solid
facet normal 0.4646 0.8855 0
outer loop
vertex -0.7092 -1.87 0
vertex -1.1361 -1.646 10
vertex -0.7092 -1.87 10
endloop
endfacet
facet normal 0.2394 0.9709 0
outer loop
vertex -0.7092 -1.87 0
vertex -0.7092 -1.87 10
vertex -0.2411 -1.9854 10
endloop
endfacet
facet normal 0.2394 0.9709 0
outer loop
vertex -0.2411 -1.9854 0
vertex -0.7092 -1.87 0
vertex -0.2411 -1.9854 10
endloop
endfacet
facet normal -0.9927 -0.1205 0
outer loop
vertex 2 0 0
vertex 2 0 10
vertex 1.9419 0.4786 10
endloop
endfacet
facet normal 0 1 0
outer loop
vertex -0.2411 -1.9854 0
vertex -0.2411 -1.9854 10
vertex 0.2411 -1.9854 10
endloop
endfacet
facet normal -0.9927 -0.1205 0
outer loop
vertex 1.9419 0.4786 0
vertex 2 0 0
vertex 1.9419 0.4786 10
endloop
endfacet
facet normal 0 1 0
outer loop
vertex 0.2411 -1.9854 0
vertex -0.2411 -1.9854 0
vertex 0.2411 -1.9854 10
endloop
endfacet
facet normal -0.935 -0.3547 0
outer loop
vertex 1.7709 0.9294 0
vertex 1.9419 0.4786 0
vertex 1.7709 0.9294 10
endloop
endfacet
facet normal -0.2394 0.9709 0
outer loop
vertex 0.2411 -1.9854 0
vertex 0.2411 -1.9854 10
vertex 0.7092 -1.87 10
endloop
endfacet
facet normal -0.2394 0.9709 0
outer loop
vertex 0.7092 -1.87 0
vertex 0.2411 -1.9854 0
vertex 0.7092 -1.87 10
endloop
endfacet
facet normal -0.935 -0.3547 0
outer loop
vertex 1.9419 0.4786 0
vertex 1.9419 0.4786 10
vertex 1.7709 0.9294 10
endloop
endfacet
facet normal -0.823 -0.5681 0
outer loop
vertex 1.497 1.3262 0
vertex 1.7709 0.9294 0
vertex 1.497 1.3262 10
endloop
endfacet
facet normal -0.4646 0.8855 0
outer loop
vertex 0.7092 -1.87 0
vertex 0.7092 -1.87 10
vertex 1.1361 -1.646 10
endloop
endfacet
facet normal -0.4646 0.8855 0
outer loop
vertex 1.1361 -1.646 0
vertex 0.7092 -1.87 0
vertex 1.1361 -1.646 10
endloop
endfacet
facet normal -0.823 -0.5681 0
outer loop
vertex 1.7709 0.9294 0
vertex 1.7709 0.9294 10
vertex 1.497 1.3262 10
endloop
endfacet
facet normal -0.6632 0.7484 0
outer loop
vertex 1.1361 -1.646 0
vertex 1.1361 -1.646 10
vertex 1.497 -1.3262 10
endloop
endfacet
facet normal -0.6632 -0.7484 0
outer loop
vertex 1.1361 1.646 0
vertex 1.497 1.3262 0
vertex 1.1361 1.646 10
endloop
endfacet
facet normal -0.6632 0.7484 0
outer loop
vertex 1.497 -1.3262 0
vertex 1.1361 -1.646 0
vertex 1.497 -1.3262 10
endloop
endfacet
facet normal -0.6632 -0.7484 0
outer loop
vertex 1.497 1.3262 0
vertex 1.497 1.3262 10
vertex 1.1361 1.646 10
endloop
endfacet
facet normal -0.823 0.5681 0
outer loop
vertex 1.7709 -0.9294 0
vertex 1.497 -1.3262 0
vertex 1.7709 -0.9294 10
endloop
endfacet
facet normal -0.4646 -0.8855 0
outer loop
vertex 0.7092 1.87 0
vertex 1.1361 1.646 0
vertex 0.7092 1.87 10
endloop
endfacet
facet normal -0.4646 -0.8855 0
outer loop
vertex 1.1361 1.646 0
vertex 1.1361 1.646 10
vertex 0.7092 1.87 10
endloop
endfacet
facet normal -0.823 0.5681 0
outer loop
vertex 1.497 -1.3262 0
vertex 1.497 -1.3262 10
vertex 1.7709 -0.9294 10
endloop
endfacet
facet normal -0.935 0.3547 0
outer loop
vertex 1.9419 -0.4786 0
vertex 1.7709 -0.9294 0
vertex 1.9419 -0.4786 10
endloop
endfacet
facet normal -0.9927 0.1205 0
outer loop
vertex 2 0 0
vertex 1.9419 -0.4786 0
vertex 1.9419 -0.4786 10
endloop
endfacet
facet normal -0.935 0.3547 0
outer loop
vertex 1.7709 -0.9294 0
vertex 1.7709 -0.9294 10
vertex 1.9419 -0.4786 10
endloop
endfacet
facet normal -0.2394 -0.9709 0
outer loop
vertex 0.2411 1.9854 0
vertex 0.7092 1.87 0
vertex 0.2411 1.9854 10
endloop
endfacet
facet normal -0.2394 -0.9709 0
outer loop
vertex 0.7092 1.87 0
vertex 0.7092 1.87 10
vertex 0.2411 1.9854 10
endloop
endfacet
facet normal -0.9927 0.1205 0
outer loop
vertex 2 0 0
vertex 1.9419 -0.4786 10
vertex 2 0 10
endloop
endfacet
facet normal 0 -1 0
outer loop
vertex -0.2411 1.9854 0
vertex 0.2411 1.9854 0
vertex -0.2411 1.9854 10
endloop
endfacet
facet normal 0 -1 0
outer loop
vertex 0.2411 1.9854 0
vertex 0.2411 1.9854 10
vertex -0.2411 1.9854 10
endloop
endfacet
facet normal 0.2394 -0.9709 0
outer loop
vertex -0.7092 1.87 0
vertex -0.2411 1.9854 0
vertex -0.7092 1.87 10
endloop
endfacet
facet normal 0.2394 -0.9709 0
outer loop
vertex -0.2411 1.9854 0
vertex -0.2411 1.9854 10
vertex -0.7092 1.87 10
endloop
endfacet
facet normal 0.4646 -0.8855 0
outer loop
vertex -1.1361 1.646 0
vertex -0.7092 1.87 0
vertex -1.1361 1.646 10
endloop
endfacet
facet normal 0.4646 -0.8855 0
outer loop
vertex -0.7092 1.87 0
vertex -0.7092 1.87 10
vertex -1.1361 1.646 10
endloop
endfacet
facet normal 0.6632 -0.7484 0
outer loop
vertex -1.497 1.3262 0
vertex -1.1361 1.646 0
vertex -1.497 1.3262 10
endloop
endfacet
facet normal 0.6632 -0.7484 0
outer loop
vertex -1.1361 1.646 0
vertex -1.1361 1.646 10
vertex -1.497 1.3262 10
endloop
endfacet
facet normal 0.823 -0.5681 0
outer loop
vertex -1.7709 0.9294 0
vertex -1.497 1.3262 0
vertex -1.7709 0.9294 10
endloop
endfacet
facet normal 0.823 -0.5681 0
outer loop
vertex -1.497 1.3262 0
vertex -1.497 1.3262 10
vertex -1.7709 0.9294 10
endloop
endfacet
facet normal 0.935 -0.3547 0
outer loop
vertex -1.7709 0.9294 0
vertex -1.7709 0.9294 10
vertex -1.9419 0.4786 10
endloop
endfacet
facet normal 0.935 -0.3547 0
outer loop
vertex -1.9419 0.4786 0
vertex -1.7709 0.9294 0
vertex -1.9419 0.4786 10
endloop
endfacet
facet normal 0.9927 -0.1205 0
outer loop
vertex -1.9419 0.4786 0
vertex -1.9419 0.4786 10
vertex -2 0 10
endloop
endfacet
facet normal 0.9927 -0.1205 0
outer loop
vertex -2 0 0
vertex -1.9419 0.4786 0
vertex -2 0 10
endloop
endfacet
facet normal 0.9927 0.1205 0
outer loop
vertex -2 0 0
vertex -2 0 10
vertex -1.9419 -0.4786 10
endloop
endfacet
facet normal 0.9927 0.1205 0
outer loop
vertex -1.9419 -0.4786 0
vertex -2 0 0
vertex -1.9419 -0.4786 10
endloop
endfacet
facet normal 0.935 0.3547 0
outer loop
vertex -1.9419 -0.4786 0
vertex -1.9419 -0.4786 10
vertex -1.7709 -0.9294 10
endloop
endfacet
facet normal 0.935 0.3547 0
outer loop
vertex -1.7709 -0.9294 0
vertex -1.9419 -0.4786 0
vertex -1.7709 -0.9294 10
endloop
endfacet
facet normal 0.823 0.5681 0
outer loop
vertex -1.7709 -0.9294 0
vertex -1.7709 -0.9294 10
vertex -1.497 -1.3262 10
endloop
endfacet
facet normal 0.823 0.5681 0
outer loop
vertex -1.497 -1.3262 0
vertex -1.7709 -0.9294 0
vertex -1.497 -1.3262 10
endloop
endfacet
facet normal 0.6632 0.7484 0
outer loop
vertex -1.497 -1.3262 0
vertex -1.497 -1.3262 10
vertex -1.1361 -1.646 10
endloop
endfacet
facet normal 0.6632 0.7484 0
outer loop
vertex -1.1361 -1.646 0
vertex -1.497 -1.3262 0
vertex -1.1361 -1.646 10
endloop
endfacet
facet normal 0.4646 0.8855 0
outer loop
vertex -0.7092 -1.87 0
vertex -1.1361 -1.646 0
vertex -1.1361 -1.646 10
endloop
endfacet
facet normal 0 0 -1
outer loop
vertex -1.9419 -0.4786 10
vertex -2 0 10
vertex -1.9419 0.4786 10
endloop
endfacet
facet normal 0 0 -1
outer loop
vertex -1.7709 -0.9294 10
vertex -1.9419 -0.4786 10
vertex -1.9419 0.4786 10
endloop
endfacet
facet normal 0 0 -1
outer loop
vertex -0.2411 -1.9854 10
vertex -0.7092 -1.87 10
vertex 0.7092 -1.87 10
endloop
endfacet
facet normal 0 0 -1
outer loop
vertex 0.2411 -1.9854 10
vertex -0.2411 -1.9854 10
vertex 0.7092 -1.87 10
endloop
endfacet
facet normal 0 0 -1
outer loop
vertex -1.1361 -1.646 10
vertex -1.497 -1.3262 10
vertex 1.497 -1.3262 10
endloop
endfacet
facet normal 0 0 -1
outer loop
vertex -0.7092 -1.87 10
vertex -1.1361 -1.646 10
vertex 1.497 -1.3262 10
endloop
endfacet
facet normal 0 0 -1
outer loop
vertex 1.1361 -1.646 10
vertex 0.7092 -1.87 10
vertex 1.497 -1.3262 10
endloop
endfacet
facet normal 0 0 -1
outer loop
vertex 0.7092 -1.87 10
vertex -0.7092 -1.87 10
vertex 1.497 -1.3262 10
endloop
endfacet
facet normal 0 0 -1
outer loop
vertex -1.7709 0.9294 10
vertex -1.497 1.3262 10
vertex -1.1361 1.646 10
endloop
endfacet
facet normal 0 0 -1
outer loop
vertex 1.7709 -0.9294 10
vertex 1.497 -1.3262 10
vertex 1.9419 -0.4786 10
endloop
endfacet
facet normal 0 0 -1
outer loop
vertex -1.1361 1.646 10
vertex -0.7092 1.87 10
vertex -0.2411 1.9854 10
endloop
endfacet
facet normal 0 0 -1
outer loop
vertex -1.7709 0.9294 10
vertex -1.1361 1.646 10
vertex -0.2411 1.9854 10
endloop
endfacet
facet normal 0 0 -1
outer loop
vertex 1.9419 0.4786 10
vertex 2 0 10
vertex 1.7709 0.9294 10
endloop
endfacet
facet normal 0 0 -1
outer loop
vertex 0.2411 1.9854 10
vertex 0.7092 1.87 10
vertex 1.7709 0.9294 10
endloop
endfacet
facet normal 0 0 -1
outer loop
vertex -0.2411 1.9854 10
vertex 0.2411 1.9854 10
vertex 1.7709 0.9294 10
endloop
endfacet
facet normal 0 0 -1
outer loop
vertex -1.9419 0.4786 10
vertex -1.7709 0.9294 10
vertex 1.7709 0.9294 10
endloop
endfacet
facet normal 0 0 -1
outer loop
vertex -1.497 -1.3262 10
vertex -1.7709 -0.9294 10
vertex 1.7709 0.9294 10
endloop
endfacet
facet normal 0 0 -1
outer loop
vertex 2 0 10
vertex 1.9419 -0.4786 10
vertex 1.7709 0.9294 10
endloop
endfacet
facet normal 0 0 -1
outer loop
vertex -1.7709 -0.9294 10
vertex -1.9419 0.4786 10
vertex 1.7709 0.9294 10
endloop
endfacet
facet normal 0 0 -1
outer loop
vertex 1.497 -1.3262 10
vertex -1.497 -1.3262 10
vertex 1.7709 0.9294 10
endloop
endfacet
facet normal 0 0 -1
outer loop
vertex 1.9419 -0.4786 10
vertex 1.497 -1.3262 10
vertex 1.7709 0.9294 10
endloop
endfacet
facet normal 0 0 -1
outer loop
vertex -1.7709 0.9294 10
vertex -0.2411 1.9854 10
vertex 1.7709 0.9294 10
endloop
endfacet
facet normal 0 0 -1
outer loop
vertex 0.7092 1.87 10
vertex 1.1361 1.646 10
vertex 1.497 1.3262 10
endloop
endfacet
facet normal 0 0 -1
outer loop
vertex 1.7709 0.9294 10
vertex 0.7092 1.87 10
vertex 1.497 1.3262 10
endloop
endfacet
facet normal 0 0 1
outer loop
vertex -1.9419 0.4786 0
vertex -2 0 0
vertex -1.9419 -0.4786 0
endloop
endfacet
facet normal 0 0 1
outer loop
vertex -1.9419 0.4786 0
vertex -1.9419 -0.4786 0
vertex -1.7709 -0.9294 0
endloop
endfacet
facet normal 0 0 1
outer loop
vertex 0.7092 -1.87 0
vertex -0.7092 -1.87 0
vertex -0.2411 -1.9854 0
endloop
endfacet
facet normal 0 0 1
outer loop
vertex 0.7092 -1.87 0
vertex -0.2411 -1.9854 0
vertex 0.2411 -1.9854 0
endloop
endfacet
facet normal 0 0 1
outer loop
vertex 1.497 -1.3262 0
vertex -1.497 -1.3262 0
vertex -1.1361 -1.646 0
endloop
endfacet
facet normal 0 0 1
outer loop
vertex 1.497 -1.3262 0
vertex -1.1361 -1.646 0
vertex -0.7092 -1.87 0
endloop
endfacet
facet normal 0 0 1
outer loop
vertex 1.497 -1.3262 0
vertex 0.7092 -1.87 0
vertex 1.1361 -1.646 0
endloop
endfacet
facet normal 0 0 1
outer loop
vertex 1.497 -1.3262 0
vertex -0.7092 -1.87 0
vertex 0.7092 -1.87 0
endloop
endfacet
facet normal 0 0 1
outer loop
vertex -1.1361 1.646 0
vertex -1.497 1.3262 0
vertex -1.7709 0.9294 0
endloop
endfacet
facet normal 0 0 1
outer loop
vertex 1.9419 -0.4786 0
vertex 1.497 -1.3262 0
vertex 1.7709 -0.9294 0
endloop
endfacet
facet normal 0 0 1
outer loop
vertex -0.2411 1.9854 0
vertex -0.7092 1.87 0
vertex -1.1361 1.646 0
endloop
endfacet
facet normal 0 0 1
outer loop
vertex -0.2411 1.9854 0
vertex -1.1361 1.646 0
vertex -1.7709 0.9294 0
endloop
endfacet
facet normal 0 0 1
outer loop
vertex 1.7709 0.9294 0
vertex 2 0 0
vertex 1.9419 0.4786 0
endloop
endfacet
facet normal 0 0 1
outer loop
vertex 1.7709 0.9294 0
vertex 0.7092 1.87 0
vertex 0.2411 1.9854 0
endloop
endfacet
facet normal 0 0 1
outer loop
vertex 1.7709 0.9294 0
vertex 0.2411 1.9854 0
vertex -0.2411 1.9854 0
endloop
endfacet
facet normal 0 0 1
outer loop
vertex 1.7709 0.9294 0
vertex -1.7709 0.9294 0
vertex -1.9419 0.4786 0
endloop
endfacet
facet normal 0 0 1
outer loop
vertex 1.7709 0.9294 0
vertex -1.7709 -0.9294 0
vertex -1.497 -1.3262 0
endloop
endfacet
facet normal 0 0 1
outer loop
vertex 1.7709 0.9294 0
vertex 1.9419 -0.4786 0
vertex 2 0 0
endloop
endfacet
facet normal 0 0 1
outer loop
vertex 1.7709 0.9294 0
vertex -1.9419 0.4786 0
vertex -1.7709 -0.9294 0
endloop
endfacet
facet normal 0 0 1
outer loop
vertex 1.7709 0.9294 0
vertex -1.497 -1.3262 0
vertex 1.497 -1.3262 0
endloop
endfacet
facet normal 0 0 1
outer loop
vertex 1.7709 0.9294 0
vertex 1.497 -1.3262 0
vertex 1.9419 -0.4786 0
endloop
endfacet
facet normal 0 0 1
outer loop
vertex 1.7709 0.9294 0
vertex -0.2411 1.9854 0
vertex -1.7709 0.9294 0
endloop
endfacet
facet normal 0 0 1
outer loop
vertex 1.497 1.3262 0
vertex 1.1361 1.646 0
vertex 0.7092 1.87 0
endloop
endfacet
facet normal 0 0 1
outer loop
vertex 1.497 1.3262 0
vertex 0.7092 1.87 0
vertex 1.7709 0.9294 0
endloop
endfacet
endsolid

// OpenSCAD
points = [
  [-0.70921,-1.87003,10],[-1.13613,-1.64597,10],[-0.70921,-1.87003,0], // Triangle 1 / 100
  [-0.241073,-1.98542,10],[-0.70921,-1.87003,10],[-0.70921,-1.87003,0],
  [-0.241073,-1.98542,10],[-0.70921,-1.87003,0],[-0.241073,-1.98542,0],
  [1.94188,0.478631,10],[2,-4.89859e-16,10],[2,-4.89859e-16,0],
  [0.241073,-1.98542,10],[-0.241073,-1.98542,10],[-0.241073,-1.98542,0],
  [1.94188,0.478631,10],[2,-4.89859e-16,0],[1.94188,0.478631,0],
  [0.241073,-1.98542,10],[-0.241073,-1.98542,0],[0.241073,-1.98542,0],
  [1.77091,0.929446,10],[1.94188,0.478631,0],[1.77091,0.929446,0],
  [0.70921,-1.87003,10],[0.241073,-1.98542,10],[0.241073,-1.98542,0],
  [0.70921,-1.87003,10],[0.241073,-1.98542,0],[0.70921,-1.87003,0], // Triangle 10 / 100
  [1.77091,0.929446,10],[1.94188,0.478631,10],[1.94188,0.478631,0],
  [1.49702,1.32625,10],[1.77091,0.929446,0],[1.49702,1.32625,0],
  [1.13613,-1.64597,10],[0.70921,-1.87003,10],[0.70921,-1.87003,0],
  [1.13613,-1.64597,10],[0.70921,-1.87003,0],[1.13613,-1.64597,0],
  [1.49702,1.32625,10],[1.77091,0.929446,10],[1.77091,0.929446,0],
  [1.49702,-1.32625,10],[1.13613,-1.64597,10],[1.13613,-1.64597,0],
  [1.13613,1.64597,10],[1.49702,1.32625,0],[1.13613,1.64597,0],
  [1.49702,-1.32625,10],[1.13613,-1.64597,0],[1.49702,-1.32625,0],
  [1.13613,1.64597,10],[1.49702,1.32625,10],[1.49702,1.32625,0],
  [1.77091,-0.929446,10],[1.49702,-1.32625,0],[1.77091,-0.929446,0], // Triangle 20 / 100
  [0.70921,1.87003,10],[1.13613,1.64597,0],[0.70921,1.87003,0],
  [0.70921,1.87003,10],[1.13613,1.64597,10],[1.13613,1.64597,0],
  [1.77091,-0.929446,10],[1.49702,-1.32625,10],[1.49702,-1.32625,0],
  [1.94188,-0.478631,10],[1.77091,-0.929446,0],[1.94188,-0.478631,0],
  [1.94188,-0.478631,10],[1.94188,-0.478631,0],[2,-4.89859e-16,0],
  [1.94188,-0.478631,10],[1.77091,-0.929446,10],[1.77091,-0.929446,0],
  [0.241073,1.98542,10],[0.70921,1.87003,0],[0.241073,1.98542,0],
  [0.241073,1.98542,10],[0.70921,1.87003,10],[0.70921,1.87003,0],
  [2,-4.89859e-16,10],[1.94188,-0.478631,10],[2,-4.89859e-16,0],
  [-0.241073,1.98542,10],[0.241073,1.98542,0],[-0.241073,1.98542,0], // Triangle 30 / 100
  [-0.241073,1.98542,10],[0.241073,1.98542,10],[0.241073,1.98542,0],
  [-0.70921,1.87003,10],[-0.241073,1.98542,0],[-0.70921,1.87003,0],
  [-0.70921,1.87003,10],[-0.241073,1.98542,10],[-0.241073,1.98542,0],
  [-1.13613,1.64597,10],[-0.70921,1.87003,0],[-1.13613,1.64597,0],
  [-1.13613,1.64597,10],[-0.70921,1.87003,10],[-0.70921,1.87003,0],
  [-1.49702,1.32625,10],[-1.13613,1.64597,0],[-1.49702,1.32625,0],
  [-1.49702,1.32625,10],[-1.13613,1.64597,10],[-1.13613,1.64597,0],
  [-1.77091,0.929446,10],[-1.49702,1.32625,0],[-1.77091,0.929446,0],
  [-1.77091,0.929446,10],[-1.49702,1.32625,10],[-1.49702,1.32625,0],
  [-1.94188,0.478631,10],[-1.77091,0.929446,10],[-1.77091,0.929446,0], // Triangle 40 / 100
  [-1.94188,0.478631,10],[-1.77091,0.929446,0],[-1.94188,0.478631,0],
  [-2,2.02129e-15,10],[-1.94188,0.478631,10],[-1.94188,0.478631,0],
  [-2,2.02129e-15,10],[-1.94188,0.478631,0],[-2,2.02129e-15,0],
  [-1.94188,-0.478631,10],[-2,2.02129e-15,10],[-2,2.02129e-15,0],
  [-1.94188,-0.478631,10],[-2,2.02129e-15,0],[-1.94188,-0.478631,0],
  [-1.77091,-0.929446,10],[-1.94188,-0.478631,10],[-1.94188,-0.478631,0],
  [-1.77091,-0.929446,10],[-1.94188,-0.478631,0],[-1.77091,-0.929446,0],
  [-1.49702,-1.32625,10],[-1.77091,-0.929446,10],[-1.77091,-0.929446,0],
  [-1.49702,-1.32625,10],[-1.77091,-0.929446,0],[-1.49702,-1.32625,0],
  [-1.13613,-1.64597,10],[-1.49702,-1.32625,10],[-1.49702,-1.32625,0], // Triangle 50 / 100
  [-1.13613,-1.64597,10],[-1.49702,-1.32625,0],[-1.13613,-1.64597,0],
  [-1.13613,-1.64597,10],[-1.13613,-1.64597,0],[-0.70921,-1.87003,0],
  [-1.94188,0.478631,10],[-2,2.02129e-15,10],[-1.94188,-0.478631,10],
  [-1.94188,0.478631,10],[-1.94188,-0.478631,10],[-1.77091,-0.929446,10],
  [0.70921,-1.87003,10],[-0.70921,-1.87003,10],[-0.241073,-1.98542,10],
  [0.70921,-1.87003,10],[-0.241073,-1.98542,10],[0.241073,-1.98542,10],
  [1.49702,-1.32625,10],[-1.49702,-1.32625,10],[-1.13613,-1.64597,10],
  [1.49702,-1.32625,10],[-1.13613,-1.64597,10],[-0.70921,-1.87003,10],
  [1.49702,-1.32625,10],[0.70921,-1.87003,10],[1.13613,-1.64597,10],
  [1.49702,-1.32625,10],[-0.70921,-1.87003,10],[0.70921,-1.87003,10], // Triangle 60 / 100
  [-1.13613,1.64597,10],[-1.49702,1.32625,10],[-1.77091,0.929446,10],
  [1.94188,-0.478631,10],[1.49702,-1.32625,10],[1.77091,-0.929446,10],
  [-0.241073,1.98542,10],[-0.70921,1.87003,10],[-1.13613,1.64597,10],
  [-0.241073,1.98542,10],[-1.13613,1.64597,10],[-1.77091,0.929446,10],
  [1.77091,0.929446,10],[2,-4.89859e-16,10],[1.94188,0.478631,10],
  [1.77091,0.929446,10],[0.70921,1.87003,10],[0.241073,1.98542,10],
  [1.77091,0.929446,10],[0.241073,1.98542,10],[-0.241073,1.98542,10],
  [1.77091,0.929446,10],[-1.77091,0.929446,10],[-1.94188,0.478631,10],
  [1.77091,0.929446,10],[-1.77091,-0.929446,10],[-1.49702,-1.32625,10],
  [1.77091,0.929446,10],[1.94188,-0.478631,10],[2,-4.89859e-16,10], // Triangle 70 / 100
  [1.77091,0.929446,10],[-1.94188,0.478631,10],[-1.77091,-0.929446,10],
  [1.77091,0.929446,10],[-1.49702,-1.32625,10],[1.49702,-1.32625,10],
  [1.77091,0.929446,10],[1.49702,-1.32625,10],[1.94188,-0.478631,10],
  [1.77091,0.929446,10],[-0.241073,1.98542,10],[-1.77091,0.929446,10],
  [1.49702,1.32625,10],[1.13613,1.64597,10],[0.70921,1.87003,10],
  [1.49702,1.32625,10],[0.70921,1.87003,10],[1.77091,0.929446,10],
  [-1.94188,-0.478631,0],[-2,2.02129e-15,0],[-1.94188,0.478631,0],
  [-1.77091,-0.929446,0],[-1.94188,-0.478631,0],[-1.94188,0.478631,0],
  [-0.241073,-1.98542,0],[-0.70921,-1.87003,0],[0.70921,-1.87003,0],
  [0.241073,-1.98542,0],[-0.241073,-1.98542,0],[0.70921,-1.87003,0], // Triangle 80 / 100
  [-1.13613,-1.64597,0],[-1.49702,-1.32625,0],[1.49702,-1.32625,0],
  [-0.70921,-1.87003,0],[-1.13613,-1.64597,0],[1.49702,-1.32625,0],
  [1.13613,-1.64597,0],[0.70921,-1.87003,0],[1.49702,-1.32625,0],
  [0.70921,-1.87003,0],[-0.70921,-1.87003,0],[1.49702,-1.32625,0],
  [-1.77091,0.929446,0],[-1.49702,1.32625,0],[-1.13613,1.64597,0],
  [1.77091,-0.929446,0],[1.49702,-1.32625,0],[1.94188,-0.478631,0],
  [-1.13613,1.64597,0],[-0.70921,1.87003,0],[-0.241073,1.98542,0],
  [-1.77091,0.929446,0],[-1.13613,1.64597,0],[-0.241073,1.98542,0],
  [1.94188,0.478631,0],[2,-4.89859e-16,0],[1.77091,0.929446,0],
  [0.241073,1.98542,0],[0.70921,1.87003,0],[1.77091,0.929446,0], // Triangle 90 / 100
  [-0.241073,1.98542,0],[0.241073,1.98542,0],[1.77091,0.929446,0],
  [-1.94188,0.478631,0],[-1.77091,0.929446,0],[1.77091,0.929446,0],
  [-1.49702,-1.32625,0],[-1.77091,-0.929446,0],[1.77091,0.929446,0],
  [2,-4.89859e-16,0],[1.94188,-0.478631,0],[1.77091,0.929446,0],
  [-1.77091,-0.929446,0],[-1.94188,0.478631,0],[1.77091,0.929446,0],
  [1.49702,-1.32625,0],[-1.49702,-1.32625,0],[1.77091,0.929446,0],
  [1.94188,-0.478631,0],[1.49702,-1.32625,0],[1.77091,0.929446,0],
  [-1.77091,0.929446,0],[-0.241073,1.98542,0],[1.77091,0.929446,0],
  [0.70921,1.87003,0],[1.13613,1.64597,0],[1.49702,1.32625,0],
  [1.77091,0.929446,0],[0.70921,1.87003,0],[1.49702,1.32625,0], // Triangle 100 / 100
];
faces = [
  [0,1,2], // Triangle 1 / 100
  [3,4,5],
  [6,7,8],
  [9,10,11],
  [12,13,14],
  [15,16,17],
  [18,19,20],
  [21,22,23],
  [24,25,26],
  [27,28,29], // Triangle 10 / 100
  [30,31,32],
  [33,34,35],
  [36,37,38],
  [39,40,41],
  [42,43,44],
  [45,46,47],
  [48,49,50],
  [51,52,53],
  [54,55,56],
  [57,58,59], // Triangle 20 / 100
  [60,61,62],
  [63,64,65],
  [66,67,68],
  [69,70,71],
  [72,73,74],
  [75,76,77],
  [78,79,80],
  [81,82,83],
  [84,85,86],
  [87,88,89], // Triangle 30 / 100
  [90,91,92],
  [93,94,95],
  [96,97,98],
  [99,100,101],
  [102,103,104],
  [105,106,107],
  [108,109,110],
  [111,112,113],
  [114,115,116],
  [117,118,119], // Triangle 40 / 100
  [120,121,122],
  [123,124,125],
  [126,127,128],
  [129,130,131],
  [132,133,134],
  [135,136,137],
  [138,139,140],
  [141,142,143],
  [144,145,146],
  [147,148,149], // Triangle 50 / 100
  [150,151,152],
  [153,154,155],
  [156,157,158],
  [159,160,161],
  [162,163,164],
  [165,166,167],
  [168,169,170],
  [171,172,173],
  [174,175,176],
  [177,178,179], // Triangle 60 / 100
  [180,181,182],
  [183,184,185],
  [186,187,188],
  [189,190,191],
  [192,193,194],
  [195,196,197],
  [198,199,200],
  [201,202,203],
  [204,205,206],
  [207,208,209], // Triangle 70 / 100
  [210,211,212],
  [213,214,215],
  [216,217,218],
  [219,220,221],
  [222,223,224],
  [225,226,227],
  [228,229,230],
  [231,232,233],
  [234,235,236],
  [237,238,239], // Triangle 80 / 100
  [240,241,242],
  [243,244,245],
  [246,247,248],
  [249,250,251],
  [252,253,254],
  [255,256,257],
  [258,259,260],
  [261,262,263],
  [264,265,266],
  [267,268,269], // Triangle 90 / 100
  [270,271,272],
  [273,274,275],
  [276,277,278],
  [279,280,281],
  [282,283,284],
  [285,286,287],
  [288,289,290],
  [291,292,293],
  [294,295,296],
  [297,298,299], // Triangle 100 / 100
];
module solid_object() {
  polyhedron (points,faces);
}

solid_object();
